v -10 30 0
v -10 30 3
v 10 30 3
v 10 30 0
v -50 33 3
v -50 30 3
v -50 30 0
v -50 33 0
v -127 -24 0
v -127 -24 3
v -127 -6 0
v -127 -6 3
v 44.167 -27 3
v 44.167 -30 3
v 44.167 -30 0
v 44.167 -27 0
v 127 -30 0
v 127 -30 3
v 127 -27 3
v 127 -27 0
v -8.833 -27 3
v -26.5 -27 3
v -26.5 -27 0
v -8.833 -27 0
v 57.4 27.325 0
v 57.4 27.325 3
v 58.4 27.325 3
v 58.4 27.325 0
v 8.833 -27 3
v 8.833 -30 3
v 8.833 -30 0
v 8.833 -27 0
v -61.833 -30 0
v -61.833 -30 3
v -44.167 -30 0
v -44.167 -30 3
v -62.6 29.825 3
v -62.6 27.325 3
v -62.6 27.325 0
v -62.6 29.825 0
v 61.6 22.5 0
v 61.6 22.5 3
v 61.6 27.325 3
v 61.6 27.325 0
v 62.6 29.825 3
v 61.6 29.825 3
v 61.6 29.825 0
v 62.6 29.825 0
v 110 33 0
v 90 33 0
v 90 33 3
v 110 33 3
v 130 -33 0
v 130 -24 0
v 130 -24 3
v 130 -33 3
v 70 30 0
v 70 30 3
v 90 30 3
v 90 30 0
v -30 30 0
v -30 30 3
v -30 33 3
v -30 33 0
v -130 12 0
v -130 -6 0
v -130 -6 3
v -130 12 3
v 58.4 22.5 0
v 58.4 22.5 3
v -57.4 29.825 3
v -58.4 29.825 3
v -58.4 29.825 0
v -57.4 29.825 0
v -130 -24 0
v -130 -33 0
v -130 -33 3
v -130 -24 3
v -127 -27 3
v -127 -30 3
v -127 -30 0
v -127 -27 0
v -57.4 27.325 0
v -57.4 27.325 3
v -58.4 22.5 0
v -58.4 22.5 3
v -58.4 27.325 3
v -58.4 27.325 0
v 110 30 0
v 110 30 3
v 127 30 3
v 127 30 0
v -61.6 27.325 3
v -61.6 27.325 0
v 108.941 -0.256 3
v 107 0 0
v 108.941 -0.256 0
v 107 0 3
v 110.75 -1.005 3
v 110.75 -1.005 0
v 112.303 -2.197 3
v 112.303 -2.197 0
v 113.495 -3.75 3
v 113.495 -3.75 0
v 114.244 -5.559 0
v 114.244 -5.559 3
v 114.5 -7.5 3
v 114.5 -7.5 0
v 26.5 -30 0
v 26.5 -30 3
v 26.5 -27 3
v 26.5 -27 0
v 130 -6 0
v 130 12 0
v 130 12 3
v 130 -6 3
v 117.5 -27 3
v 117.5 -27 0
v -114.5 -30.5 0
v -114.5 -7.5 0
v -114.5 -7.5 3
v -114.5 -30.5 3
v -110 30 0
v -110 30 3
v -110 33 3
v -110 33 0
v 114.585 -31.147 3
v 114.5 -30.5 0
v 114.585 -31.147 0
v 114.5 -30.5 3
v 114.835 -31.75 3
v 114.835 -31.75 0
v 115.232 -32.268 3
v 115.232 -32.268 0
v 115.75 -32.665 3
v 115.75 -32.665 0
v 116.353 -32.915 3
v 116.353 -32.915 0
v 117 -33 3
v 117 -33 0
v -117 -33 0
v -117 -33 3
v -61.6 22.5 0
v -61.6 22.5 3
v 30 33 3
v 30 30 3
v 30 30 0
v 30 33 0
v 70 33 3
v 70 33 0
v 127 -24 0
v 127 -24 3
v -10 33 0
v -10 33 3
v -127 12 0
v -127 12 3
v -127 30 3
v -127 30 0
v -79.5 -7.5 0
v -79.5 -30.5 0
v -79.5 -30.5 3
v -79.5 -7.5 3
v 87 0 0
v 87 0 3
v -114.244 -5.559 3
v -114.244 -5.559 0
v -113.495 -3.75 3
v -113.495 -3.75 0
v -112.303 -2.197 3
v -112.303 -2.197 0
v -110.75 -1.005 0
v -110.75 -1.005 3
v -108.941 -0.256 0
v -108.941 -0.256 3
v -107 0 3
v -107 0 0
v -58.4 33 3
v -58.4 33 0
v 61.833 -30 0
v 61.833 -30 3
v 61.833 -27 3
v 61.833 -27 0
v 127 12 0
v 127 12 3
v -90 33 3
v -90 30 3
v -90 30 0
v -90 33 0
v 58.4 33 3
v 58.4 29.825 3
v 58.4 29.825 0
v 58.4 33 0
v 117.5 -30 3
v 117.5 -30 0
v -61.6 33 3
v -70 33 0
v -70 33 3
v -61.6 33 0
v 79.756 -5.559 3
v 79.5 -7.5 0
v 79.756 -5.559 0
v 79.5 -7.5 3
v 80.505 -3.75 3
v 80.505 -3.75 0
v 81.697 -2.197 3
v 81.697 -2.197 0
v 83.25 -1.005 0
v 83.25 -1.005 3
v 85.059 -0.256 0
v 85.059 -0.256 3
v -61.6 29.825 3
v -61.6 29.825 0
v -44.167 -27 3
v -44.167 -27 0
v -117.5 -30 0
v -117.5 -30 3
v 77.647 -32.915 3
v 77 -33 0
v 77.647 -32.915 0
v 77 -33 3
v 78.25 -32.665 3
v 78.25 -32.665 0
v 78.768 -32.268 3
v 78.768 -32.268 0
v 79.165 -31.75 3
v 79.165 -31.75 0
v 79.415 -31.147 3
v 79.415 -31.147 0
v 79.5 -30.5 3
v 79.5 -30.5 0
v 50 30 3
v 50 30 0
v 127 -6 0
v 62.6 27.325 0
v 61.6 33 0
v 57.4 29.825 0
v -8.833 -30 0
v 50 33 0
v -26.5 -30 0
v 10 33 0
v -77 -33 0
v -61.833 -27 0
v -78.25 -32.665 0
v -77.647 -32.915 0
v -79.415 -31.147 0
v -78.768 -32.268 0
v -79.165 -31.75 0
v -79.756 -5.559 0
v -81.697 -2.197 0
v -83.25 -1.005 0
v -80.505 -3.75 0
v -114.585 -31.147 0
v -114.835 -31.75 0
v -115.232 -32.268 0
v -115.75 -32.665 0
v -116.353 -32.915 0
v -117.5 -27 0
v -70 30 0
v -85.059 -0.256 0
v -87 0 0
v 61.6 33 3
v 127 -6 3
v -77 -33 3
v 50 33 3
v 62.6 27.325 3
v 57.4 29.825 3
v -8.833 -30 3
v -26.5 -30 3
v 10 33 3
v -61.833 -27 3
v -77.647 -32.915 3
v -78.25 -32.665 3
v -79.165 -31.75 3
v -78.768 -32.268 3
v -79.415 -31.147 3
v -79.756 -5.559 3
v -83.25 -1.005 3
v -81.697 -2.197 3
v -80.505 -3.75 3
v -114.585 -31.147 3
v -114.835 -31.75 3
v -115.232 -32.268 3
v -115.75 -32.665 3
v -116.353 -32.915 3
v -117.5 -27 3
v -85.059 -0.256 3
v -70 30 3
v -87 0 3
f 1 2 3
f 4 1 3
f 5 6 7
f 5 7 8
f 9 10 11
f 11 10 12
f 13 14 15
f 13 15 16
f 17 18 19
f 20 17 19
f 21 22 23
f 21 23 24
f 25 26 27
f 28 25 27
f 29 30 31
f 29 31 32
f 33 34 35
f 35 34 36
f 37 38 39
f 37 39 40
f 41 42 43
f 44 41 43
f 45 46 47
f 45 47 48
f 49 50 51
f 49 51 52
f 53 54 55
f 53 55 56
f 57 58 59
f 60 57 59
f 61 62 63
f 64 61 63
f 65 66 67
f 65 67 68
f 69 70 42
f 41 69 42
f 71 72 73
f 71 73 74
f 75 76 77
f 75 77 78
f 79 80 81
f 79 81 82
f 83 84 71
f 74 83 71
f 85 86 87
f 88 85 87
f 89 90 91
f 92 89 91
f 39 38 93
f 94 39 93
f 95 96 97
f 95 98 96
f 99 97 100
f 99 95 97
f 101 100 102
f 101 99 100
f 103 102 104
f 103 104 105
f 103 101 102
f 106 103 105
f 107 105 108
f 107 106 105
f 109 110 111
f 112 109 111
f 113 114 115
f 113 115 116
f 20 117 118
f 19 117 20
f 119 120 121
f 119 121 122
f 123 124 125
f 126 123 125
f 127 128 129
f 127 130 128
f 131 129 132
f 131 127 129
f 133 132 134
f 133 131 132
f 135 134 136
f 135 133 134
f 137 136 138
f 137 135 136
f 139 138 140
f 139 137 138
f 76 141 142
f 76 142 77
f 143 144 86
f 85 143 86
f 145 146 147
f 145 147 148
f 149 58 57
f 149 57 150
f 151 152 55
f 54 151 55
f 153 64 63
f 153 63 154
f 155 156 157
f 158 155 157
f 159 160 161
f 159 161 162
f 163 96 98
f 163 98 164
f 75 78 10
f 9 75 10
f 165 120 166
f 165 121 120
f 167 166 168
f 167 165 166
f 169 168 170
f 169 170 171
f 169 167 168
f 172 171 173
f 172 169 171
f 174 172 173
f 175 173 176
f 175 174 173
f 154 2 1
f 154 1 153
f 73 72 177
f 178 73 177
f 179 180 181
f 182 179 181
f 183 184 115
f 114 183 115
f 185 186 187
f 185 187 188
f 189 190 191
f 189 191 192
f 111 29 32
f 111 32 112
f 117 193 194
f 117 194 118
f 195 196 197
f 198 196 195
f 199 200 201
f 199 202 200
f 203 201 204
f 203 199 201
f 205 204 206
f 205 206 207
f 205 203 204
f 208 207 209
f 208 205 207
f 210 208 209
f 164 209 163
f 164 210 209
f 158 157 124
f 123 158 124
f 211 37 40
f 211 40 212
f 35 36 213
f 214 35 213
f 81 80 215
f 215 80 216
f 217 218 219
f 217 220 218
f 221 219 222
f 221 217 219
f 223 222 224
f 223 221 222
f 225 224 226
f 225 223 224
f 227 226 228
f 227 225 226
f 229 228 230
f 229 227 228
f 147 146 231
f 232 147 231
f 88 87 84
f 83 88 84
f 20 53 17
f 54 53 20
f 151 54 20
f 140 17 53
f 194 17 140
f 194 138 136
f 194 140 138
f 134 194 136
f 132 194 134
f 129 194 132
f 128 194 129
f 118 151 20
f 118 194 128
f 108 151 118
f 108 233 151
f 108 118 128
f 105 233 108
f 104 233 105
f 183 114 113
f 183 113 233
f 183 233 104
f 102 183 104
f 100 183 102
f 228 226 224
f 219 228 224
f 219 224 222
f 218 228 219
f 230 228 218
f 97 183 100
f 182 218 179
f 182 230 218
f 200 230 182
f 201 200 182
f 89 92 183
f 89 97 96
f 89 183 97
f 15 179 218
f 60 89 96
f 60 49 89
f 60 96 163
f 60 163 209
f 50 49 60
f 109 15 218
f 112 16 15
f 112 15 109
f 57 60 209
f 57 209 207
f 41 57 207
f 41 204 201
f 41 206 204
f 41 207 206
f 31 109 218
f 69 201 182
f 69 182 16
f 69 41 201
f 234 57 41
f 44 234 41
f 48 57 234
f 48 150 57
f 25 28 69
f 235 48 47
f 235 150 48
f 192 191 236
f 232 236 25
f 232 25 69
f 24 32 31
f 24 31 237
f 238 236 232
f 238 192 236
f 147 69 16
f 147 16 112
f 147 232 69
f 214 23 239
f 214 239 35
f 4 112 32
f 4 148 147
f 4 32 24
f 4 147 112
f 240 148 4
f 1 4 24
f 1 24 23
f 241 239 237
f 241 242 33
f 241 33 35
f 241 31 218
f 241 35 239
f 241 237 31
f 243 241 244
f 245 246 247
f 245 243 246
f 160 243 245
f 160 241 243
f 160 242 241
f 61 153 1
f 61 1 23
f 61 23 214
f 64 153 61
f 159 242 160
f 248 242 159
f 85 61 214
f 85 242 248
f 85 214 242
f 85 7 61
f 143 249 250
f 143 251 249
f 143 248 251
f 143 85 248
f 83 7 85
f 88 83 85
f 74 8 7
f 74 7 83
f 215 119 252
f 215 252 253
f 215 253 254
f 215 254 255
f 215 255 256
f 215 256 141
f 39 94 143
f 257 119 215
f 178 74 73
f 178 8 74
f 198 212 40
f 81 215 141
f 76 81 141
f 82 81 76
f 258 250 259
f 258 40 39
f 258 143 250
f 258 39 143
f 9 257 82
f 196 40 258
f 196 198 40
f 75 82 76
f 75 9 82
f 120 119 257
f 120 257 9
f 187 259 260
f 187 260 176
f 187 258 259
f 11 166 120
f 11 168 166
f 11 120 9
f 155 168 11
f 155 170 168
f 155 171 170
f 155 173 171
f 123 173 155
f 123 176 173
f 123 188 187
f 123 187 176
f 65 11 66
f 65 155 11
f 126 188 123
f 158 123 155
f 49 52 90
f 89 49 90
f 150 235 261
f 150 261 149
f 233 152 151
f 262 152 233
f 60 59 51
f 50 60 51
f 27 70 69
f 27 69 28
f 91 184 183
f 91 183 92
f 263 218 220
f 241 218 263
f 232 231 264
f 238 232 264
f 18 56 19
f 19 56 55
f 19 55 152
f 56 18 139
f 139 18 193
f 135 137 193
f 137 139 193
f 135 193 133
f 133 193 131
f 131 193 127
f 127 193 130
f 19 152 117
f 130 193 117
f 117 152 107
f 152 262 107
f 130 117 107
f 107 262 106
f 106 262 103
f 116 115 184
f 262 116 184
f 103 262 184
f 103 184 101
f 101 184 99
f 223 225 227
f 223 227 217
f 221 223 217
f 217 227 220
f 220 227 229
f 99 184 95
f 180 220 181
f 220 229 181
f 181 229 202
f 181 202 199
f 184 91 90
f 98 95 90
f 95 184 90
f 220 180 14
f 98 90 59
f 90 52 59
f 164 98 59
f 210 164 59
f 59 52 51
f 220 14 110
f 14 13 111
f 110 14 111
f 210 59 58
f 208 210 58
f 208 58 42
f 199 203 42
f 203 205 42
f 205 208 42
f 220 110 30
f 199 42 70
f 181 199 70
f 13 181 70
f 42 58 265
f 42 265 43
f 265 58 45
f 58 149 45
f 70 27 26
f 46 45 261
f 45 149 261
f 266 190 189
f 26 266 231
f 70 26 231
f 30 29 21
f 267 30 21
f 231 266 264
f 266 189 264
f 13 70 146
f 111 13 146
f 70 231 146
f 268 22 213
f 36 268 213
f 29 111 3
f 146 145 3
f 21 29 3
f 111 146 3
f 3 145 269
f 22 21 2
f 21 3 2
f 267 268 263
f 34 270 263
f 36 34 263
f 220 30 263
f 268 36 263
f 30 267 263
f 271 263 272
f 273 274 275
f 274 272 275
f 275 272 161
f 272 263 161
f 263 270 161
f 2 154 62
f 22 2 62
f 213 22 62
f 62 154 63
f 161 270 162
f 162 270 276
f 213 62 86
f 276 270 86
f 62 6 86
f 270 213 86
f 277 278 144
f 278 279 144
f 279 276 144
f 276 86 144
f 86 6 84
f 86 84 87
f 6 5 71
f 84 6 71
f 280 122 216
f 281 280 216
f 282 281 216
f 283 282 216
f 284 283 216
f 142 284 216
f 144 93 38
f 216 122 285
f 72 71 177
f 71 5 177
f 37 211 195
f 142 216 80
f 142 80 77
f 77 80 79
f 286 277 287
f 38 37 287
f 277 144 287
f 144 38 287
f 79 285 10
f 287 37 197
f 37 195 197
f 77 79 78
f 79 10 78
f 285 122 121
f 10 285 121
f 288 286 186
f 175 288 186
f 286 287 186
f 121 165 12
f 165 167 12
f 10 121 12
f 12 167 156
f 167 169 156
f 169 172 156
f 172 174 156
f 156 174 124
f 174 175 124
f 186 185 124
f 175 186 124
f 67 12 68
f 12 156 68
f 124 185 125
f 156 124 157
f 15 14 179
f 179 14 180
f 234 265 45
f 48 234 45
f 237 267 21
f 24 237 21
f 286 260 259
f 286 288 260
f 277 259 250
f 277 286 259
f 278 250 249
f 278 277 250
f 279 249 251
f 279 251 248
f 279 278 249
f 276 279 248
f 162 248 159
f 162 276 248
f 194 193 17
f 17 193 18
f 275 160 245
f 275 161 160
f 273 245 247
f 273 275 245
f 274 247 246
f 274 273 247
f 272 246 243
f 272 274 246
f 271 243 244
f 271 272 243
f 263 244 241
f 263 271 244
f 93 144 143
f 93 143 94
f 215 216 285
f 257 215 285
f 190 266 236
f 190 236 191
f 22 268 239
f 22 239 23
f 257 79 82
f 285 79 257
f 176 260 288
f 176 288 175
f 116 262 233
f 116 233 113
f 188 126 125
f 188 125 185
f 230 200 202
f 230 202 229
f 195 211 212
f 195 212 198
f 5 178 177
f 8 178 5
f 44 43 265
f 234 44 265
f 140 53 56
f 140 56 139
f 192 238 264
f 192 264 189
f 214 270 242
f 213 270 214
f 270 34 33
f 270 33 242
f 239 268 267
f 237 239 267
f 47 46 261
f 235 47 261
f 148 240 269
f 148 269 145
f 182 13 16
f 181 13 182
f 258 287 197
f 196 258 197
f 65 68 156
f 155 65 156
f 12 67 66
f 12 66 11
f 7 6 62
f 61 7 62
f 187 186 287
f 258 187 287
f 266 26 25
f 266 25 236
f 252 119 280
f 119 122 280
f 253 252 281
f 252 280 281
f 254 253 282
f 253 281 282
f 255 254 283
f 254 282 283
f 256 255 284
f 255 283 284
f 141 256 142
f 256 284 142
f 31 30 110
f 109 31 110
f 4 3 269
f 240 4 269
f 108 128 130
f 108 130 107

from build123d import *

# Parameters (mm, degrees)
BOSS_EXTRUDE1_DEPTH     = 3
SKETCH2_W               = 3
SKETCH2_H               = 18
SKETCH2_W_2             = 17.666666666
SKETCH2_H_2             = 3
SKETCH2_W_3             = 17.666666667
SKETCH2_W_4             = 9.5
SKETCH2_W_5             = 20
CUT_EXTRUDE1_DEPTH      = 1
CUT_EXTRUDE1_DEPTH_BACK = 4
SKETCH3_W               = 3.2
SKETCH3_H               = 10.5
SKETCH3_W_2             = 5.2
SKETCH3_H_2             = 2.5
CUT_EXTRUDE2_DEPTH      = 1
CUT_EXTRUDE2_DEPTH_BACK = 4
FILLET1_R               = 7.5
FILLET2_R               = 2.5


with BuildPart() as part:
    # Sketch1 → Boss-Extrude1 (new body)
    with BuildSketch(Plane.XY):
        Polygon((-130, 33), (130, 33), (130, -33), (114.5, -33), (114.5, 0), (79.5, 0), (79.5, -33), (-79.5, -33), (-79.5, 0), (-114.5, 0), (-114.5, -33), (-130, -33), align=None)
    extrude(amount=BOSS_EXTRUDE1_DEPTH)

    # Sketch2 → Cut-Extrude1 (cut, two sides)
    with BuildSketch(Plane.XY.offset(3)) as cut_extrude1_sk:
        with Locations((-128.5, 21)):
            Rectangle(SKETCH2_W, SKETCH2_H)
        with Locations((-128.5, -15)):
            Rectangle(SKETCH2_W, SKETCH2_H)
        with Locations((-53, -28.5)):
            Rectangle(SKETCH2_W_2, SKETCH2_H_2)
        with Locations((-17.666666666, -28.5)):
            Rectangle(SKETCH2_W_3, SKETCH2_H_2)
        with Locations((17.666666666, -28.5)):
            Rectangle(SKETCH2_W_3, SKETCH2_H_2)
        with Locations((53, -28.5)):
            Rectangle(SKETCH2_W_2, SKETCH2_H_2)
        with Locations((122.25, -28.5)):
            Rectangle(SKETCH2_W_4, SKETCH2_H_2)
        with Locations((128.5, -15)):
            Rectangle(SKETCH2_W, SKETCH2_H)
        with Locations((128.5, 21)):
            Rectangle(SKETCH2_W, SKETCH2_H)
        Polygon((130, 33), (110, 33), (110, 30), (127, 30), (130, 30), align=None)
        with Locations((80, 31.5)):
            Rectangle(SKETCH2_W_5, SKETCH2_H_2)
        with Locations((40, 31.5)):
            Rectangle(SKETCH2_W_5, SKETCH2_H_2)
        with Locations((-40, 31.5)):
            Rectangle(SKETCH2_W_5, SKETCH2_H_2)
        with Locations((-80, 31.5)):
            Rectangle(SKETCH2_W_5, SKETCH2_H_2)
        with Locations((0, 31.5)):
            Rectangle(SKETCH2_W_5, SKETCH2_H_2)
        with Locations((-120, 31.5)):
            Rectangle(SKETCH2_W_5, SKETCH2_H_2)
        with Locations((-122.25, -28.5)):
            Rectangle(SKETCH2_W_4, SKETCH2_H_2)
    extrude(amount=CUT_EXTRUDE1_DEPTH, mode=Mode.SUBTRACT)
    extrude(cut_extrude1_sk.sketch, amount=-CUT_EXTRUDE1_DEPTH_BACK, mode=Mode.SUBTRACT)

    # Sketch3 → Cut-Extrude2 (cut, two sides)
    with BuildSketch(Plane.XY.offset(3)) as cut_extrude2_sk:
        with Locations((-60, 27.75)):
            Rectangle(SKETCH3_W, SKETCH3_H)
        with Locations((60, 27.75)):
            Rectangle(SKETCH3_W, SKETCH3_H)
        with Locations((-60, 28.575)):
            Rectangle(SKETCH3_W_2, SKETCH3_H_2)
        with Locations((60, 28.575)):
            Rectangle(SKETCH3_W_2, SKETCH3_H_2)
    extrude(amount=CUT_EXTRUDE2_DEPTH, mode=Mode.SUBTRACT)
    extrude(cut_extrude2_sk.sketch, amount=-CUT_EXTRUDE2_DEPTH_BACK, mode=Mode.SUBTRACT)

    # Fillet1
    fillet1_edges = [part.edges().sort_by_distance(p)[0] for p in [
        (114.5, 0, 1.5),
        (79.5, 0, 1.5),
        (-79.5, 0, 1.5),
        (-114.5, 0, 1.5),
    ]]
    fillet(fillet1_edges, radius=FILLET1_R)

    # Fillet2
    fillet2_edges = [part.edges().sort_by_distance(p)[0] for p in [
        (114.5, -33, 1.5),
        (79.5, -33, 1.5),
        (-79.5, -33, 1.5),
        (-114.5, -33, 1.5),
    ]]
    fillet(fillet2_edges, radius=FILLET2_R)


solid = part.part
